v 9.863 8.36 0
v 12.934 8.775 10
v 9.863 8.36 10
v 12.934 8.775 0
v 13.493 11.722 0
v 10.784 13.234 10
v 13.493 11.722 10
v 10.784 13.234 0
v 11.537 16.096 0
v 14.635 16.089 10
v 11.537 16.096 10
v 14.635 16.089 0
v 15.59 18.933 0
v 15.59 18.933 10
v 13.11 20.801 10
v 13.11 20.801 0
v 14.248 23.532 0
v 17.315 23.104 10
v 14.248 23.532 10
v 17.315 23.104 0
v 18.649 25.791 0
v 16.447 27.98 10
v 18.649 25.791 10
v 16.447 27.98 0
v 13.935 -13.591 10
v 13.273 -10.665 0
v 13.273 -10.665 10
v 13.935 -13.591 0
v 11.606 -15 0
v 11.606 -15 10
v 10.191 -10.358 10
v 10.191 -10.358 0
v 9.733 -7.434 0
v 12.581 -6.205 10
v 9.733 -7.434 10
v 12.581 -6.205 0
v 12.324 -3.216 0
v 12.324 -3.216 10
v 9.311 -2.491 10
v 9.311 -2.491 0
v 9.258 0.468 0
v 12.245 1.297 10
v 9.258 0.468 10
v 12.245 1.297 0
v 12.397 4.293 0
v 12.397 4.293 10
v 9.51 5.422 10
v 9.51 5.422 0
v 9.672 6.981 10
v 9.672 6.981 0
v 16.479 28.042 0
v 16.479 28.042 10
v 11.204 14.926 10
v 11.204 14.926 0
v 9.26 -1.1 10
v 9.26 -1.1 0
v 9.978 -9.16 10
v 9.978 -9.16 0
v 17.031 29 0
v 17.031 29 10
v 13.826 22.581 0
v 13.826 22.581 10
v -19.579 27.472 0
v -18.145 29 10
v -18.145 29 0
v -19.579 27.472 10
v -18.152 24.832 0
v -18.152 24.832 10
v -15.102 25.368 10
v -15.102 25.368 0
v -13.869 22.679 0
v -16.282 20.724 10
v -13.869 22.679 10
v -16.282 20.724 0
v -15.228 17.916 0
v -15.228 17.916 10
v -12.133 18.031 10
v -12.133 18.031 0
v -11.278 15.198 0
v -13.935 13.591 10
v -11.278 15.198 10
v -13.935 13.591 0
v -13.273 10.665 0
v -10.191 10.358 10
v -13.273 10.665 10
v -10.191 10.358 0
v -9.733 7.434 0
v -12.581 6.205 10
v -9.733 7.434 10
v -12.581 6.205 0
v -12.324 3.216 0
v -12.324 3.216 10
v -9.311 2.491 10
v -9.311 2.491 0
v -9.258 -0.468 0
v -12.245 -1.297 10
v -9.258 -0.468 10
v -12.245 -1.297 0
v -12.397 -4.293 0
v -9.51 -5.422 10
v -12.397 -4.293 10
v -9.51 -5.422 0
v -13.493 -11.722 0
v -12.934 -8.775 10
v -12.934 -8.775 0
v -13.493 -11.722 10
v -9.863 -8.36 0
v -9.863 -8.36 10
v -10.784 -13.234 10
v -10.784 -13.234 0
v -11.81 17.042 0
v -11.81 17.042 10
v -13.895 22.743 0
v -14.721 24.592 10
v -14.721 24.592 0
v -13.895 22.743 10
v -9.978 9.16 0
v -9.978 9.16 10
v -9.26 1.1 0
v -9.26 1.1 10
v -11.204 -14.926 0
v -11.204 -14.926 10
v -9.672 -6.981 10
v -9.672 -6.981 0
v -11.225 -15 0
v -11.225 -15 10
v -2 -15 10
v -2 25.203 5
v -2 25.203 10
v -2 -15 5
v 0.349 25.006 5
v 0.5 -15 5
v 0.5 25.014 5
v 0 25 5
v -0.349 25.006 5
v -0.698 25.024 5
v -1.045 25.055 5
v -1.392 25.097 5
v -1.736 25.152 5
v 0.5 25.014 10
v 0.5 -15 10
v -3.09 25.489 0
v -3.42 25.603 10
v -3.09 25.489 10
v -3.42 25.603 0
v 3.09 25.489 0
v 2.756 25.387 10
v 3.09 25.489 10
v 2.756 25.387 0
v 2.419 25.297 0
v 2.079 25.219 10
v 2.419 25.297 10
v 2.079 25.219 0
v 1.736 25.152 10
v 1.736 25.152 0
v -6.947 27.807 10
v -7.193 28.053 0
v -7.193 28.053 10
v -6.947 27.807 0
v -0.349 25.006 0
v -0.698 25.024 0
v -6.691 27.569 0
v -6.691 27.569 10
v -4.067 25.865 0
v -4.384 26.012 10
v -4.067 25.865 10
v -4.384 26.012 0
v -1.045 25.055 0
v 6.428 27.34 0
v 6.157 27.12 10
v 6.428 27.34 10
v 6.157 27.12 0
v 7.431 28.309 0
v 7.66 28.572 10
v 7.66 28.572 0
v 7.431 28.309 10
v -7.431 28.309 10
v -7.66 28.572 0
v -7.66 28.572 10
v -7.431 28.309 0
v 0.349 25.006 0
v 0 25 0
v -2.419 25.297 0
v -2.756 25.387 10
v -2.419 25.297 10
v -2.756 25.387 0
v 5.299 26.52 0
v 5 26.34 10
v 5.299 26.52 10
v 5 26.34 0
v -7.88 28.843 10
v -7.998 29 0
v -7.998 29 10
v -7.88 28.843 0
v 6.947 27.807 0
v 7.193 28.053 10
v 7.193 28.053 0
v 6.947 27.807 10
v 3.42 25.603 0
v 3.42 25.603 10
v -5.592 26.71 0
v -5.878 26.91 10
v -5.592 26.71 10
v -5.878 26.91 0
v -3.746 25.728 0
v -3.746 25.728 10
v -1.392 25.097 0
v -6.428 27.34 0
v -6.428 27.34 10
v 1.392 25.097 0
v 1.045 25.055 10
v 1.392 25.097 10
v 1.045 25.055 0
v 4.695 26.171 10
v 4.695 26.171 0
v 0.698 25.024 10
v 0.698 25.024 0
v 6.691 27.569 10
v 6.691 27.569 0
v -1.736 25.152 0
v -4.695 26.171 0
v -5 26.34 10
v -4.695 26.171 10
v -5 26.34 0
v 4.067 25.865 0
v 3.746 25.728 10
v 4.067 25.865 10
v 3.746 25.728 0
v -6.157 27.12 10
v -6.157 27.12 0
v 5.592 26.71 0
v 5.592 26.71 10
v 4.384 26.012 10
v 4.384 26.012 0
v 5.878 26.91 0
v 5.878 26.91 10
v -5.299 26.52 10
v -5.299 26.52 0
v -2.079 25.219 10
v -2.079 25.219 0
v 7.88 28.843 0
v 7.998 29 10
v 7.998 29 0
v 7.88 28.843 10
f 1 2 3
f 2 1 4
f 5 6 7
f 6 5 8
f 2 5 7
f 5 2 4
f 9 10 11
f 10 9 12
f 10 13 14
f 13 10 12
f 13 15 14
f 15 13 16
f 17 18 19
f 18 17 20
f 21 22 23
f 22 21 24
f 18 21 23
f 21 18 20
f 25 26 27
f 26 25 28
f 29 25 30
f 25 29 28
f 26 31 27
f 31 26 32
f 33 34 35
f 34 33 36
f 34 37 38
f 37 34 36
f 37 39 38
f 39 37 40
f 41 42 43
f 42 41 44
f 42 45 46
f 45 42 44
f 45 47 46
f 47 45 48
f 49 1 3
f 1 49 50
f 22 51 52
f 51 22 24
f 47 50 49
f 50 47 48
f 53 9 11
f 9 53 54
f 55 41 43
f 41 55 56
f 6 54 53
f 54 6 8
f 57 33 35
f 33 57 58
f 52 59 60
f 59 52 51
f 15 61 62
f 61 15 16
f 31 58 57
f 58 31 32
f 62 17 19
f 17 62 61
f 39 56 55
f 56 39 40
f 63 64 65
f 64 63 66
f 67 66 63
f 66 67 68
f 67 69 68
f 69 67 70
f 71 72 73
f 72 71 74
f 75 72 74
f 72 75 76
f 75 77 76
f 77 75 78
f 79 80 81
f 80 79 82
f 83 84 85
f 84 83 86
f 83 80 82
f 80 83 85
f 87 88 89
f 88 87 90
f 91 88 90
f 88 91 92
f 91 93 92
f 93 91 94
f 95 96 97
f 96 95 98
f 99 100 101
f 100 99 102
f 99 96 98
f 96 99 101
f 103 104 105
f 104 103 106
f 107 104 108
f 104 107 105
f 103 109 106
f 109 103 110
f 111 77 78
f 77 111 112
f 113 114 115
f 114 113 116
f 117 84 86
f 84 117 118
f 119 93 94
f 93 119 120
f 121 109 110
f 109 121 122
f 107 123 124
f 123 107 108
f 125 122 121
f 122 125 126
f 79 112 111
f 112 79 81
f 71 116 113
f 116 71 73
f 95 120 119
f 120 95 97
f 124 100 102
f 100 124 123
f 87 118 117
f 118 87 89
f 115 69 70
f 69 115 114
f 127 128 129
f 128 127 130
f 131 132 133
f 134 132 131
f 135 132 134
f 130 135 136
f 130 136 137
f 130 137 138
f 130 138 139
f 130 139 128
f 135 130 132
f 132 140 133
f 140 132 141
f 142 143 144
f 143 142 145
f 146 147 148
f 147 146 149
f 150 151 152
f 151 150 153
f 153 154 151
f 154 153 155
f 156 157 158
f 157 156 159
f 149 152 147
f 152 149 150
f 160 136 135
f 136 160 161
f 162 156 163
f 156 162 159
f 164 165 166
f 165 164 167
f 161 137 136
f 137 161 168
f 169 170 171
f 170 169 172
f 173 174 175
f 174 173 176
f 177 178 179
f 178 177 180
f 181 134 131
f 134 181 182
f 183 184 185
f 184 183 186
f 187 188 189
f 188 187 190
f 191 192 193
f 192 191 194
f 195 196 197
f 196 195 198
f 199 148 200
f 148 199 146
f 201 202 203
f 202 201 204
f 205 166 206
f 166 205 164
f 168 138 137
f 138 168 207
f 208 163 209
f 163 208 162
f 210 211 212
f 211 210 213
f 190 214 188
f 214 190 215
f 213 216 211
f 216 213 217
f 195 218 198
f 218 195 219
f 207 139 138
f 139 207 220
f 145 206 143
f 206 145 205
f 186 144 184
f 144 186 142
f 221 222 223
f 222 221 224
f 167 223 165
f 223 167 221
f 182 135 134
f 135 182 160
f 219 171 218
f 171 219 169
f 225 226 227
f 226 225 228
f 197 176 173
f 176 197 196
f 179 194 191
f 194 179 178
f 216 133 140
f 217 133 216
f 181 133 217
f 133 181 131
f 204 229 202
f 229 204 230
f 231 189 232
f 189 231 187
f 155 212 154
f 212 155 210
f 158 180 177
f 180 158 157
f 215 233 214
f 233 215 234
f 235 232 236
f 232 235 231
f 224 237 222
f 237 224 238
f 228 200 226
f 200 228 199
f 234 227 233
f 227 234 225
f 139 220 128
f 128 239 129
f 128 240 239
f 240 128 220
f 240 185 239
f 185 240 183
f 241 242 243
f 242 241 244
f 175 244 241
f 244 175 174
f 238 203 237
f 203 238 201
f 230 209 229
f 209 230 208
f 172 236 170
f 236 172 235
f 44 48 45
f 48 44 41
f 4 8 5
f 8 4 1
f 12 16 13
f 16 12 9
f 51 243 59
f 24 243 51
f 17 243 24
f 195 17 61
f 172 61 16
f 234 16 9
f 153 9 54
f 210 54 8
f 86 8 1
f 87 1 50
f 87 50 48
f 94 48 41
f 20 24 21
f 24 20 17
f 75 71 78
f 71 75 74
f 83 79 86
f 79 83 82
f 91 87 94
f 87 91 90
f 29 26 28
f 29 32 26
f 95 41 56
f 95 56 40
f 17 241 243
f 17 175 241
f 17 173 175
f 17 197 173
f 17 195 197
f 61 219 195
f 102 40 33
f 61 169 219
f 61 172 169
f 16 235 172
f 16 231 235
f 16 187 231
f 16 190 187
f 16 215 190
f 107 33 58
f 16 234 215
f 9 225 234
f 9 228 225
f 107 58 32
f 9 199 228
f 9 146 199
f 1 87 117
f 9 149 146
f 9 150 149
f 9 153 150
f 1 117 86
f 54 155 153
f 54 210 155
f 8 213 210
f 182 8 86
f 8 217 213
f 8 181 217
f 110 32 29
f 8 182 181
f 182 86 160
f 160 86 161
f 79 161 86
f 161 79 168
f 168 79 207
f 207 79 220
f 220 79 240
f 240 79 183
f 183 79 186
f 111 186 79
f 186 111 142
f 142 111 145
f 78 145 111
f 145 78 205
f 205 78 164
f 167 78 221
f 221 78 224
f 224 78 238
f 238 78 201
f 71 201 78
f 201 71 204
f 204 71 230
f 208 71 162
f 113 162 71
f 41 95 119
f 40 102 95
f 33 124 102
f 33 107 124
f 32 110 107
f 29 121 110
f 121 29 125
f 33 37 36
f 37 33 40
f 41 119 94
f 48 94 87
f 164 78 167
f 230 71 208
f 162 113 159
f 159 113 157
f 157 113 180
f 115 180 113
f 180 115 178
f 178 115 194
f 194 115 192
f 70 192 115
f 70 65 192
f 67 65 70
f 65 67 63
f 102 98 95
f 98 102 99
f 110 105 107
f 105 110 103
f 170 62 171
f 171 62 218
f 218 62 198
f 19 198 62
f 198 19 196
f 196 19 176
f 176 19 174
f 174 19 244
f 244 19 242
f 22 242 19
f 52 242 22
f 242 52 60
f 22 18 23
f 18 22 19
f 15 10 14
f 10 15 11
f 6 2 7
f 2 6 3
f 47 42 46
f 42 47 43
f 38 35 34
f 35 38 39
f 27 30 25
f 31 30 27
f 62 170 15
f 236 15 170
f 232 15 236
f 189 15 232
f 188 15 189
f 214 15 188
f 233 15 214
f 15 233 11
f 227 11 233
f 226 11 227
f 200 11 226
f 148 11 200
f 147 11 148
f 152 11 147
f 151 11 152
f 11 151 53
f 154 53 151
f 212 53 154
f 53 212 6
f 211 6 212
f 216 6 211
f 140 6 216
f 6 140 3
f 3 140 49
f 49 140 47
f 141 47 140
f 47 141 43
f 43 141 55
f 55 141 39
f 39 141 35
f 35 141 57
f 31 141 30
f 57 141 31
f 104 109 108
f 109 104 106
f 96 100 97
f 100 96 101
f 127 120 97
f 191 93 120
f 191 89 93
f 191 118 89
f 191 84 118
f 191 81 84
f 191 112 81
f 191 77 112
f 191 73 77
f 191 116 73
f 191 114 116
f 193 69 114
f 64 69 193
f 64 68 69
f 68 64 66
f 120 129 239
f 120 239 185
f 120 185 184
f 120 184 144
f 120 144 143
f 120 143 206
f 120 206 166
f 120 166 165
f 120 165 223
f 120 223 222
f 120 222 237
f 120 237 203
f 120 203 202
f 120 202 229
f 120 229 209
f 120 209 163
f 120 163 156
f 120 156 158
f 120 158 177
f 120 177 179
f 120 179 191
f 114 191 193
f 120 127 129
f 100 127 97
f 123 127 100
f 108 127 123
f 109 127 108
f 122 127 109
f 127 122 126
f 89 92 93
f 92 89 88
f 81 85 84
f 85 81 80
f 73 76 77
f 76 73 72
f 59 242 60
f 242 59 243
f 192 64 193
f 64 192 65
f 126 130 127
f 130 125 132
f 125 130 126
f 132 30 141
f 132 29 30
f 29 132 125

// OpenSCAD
/******************************************************************************!
 * \file camshaftLocker.scad
 * \author Sebastien Beaugrand
 * \sa http://beaugrand.chez.com/
 * \copyright CeCILL 2.1 Free Software license
 * \note Bloqueur d'arbre à cames pour Zafira A 1.8 essence 1999 (moteur X18XE1)
 *       Tested
 ******************************************************************************/
dPulley = 116;
rPulley = dPulley/2;
nPulley = 46;
hPulley = 10;
LTeeth = 5;
lTeeth = 3;
hTeeth = 3;
entraxe = dPulley+18.5;
tLocker = 29;
bLocker = 15;
hLocker = tLocker + bLocker;
lLocker = 45;

module camshaftPulley() {
    difference() {
        cylinder(h=hPulley+2, r=rPulley, $fn=180);
        for(i=[1:nPulley])
            rotate([0,0,i*(360/nPulley)])
            translate([rPulley-3,0,-1])
            linear_extrude(height=hPulley+4)
            polygon([[hTeeth*2,lTeeth/2+LTeeth-lTeeth],
                     [0,lTeeth/2],
                     [0,-lTeeth/2],
                     [hTeeth*2,-(lTeeth/2+LTeeth-lTeeth)]]);
    }
}
module camshaftLocker() {
    difference() {
        translate([entraxe/2-lLocker/2,-bLocker,0]) cube([lLocker,hLocker,hPulley]);
        union() {
            translate([0,0,-1]) rotate([0,0,180/nPulley-1]) camshaftPulley();
            translate([entraxe,0,-1]) rotate([0,0,180/nPulley-1]) camshaftPulley();
            translate([entraxe/2-0.5,-bLocker-1,-1]) cube([2.5,hLocker+2,hPulley/2+1]);
            translate([entraxe/2,tLocker+6,-1]) cylinder(h=hPulley+2, r=10, $fn=180);
        }
    }
}
rotate([0,180,0]) translate([-entraxe/2,0,-hPulley]) camshaftLocker();
